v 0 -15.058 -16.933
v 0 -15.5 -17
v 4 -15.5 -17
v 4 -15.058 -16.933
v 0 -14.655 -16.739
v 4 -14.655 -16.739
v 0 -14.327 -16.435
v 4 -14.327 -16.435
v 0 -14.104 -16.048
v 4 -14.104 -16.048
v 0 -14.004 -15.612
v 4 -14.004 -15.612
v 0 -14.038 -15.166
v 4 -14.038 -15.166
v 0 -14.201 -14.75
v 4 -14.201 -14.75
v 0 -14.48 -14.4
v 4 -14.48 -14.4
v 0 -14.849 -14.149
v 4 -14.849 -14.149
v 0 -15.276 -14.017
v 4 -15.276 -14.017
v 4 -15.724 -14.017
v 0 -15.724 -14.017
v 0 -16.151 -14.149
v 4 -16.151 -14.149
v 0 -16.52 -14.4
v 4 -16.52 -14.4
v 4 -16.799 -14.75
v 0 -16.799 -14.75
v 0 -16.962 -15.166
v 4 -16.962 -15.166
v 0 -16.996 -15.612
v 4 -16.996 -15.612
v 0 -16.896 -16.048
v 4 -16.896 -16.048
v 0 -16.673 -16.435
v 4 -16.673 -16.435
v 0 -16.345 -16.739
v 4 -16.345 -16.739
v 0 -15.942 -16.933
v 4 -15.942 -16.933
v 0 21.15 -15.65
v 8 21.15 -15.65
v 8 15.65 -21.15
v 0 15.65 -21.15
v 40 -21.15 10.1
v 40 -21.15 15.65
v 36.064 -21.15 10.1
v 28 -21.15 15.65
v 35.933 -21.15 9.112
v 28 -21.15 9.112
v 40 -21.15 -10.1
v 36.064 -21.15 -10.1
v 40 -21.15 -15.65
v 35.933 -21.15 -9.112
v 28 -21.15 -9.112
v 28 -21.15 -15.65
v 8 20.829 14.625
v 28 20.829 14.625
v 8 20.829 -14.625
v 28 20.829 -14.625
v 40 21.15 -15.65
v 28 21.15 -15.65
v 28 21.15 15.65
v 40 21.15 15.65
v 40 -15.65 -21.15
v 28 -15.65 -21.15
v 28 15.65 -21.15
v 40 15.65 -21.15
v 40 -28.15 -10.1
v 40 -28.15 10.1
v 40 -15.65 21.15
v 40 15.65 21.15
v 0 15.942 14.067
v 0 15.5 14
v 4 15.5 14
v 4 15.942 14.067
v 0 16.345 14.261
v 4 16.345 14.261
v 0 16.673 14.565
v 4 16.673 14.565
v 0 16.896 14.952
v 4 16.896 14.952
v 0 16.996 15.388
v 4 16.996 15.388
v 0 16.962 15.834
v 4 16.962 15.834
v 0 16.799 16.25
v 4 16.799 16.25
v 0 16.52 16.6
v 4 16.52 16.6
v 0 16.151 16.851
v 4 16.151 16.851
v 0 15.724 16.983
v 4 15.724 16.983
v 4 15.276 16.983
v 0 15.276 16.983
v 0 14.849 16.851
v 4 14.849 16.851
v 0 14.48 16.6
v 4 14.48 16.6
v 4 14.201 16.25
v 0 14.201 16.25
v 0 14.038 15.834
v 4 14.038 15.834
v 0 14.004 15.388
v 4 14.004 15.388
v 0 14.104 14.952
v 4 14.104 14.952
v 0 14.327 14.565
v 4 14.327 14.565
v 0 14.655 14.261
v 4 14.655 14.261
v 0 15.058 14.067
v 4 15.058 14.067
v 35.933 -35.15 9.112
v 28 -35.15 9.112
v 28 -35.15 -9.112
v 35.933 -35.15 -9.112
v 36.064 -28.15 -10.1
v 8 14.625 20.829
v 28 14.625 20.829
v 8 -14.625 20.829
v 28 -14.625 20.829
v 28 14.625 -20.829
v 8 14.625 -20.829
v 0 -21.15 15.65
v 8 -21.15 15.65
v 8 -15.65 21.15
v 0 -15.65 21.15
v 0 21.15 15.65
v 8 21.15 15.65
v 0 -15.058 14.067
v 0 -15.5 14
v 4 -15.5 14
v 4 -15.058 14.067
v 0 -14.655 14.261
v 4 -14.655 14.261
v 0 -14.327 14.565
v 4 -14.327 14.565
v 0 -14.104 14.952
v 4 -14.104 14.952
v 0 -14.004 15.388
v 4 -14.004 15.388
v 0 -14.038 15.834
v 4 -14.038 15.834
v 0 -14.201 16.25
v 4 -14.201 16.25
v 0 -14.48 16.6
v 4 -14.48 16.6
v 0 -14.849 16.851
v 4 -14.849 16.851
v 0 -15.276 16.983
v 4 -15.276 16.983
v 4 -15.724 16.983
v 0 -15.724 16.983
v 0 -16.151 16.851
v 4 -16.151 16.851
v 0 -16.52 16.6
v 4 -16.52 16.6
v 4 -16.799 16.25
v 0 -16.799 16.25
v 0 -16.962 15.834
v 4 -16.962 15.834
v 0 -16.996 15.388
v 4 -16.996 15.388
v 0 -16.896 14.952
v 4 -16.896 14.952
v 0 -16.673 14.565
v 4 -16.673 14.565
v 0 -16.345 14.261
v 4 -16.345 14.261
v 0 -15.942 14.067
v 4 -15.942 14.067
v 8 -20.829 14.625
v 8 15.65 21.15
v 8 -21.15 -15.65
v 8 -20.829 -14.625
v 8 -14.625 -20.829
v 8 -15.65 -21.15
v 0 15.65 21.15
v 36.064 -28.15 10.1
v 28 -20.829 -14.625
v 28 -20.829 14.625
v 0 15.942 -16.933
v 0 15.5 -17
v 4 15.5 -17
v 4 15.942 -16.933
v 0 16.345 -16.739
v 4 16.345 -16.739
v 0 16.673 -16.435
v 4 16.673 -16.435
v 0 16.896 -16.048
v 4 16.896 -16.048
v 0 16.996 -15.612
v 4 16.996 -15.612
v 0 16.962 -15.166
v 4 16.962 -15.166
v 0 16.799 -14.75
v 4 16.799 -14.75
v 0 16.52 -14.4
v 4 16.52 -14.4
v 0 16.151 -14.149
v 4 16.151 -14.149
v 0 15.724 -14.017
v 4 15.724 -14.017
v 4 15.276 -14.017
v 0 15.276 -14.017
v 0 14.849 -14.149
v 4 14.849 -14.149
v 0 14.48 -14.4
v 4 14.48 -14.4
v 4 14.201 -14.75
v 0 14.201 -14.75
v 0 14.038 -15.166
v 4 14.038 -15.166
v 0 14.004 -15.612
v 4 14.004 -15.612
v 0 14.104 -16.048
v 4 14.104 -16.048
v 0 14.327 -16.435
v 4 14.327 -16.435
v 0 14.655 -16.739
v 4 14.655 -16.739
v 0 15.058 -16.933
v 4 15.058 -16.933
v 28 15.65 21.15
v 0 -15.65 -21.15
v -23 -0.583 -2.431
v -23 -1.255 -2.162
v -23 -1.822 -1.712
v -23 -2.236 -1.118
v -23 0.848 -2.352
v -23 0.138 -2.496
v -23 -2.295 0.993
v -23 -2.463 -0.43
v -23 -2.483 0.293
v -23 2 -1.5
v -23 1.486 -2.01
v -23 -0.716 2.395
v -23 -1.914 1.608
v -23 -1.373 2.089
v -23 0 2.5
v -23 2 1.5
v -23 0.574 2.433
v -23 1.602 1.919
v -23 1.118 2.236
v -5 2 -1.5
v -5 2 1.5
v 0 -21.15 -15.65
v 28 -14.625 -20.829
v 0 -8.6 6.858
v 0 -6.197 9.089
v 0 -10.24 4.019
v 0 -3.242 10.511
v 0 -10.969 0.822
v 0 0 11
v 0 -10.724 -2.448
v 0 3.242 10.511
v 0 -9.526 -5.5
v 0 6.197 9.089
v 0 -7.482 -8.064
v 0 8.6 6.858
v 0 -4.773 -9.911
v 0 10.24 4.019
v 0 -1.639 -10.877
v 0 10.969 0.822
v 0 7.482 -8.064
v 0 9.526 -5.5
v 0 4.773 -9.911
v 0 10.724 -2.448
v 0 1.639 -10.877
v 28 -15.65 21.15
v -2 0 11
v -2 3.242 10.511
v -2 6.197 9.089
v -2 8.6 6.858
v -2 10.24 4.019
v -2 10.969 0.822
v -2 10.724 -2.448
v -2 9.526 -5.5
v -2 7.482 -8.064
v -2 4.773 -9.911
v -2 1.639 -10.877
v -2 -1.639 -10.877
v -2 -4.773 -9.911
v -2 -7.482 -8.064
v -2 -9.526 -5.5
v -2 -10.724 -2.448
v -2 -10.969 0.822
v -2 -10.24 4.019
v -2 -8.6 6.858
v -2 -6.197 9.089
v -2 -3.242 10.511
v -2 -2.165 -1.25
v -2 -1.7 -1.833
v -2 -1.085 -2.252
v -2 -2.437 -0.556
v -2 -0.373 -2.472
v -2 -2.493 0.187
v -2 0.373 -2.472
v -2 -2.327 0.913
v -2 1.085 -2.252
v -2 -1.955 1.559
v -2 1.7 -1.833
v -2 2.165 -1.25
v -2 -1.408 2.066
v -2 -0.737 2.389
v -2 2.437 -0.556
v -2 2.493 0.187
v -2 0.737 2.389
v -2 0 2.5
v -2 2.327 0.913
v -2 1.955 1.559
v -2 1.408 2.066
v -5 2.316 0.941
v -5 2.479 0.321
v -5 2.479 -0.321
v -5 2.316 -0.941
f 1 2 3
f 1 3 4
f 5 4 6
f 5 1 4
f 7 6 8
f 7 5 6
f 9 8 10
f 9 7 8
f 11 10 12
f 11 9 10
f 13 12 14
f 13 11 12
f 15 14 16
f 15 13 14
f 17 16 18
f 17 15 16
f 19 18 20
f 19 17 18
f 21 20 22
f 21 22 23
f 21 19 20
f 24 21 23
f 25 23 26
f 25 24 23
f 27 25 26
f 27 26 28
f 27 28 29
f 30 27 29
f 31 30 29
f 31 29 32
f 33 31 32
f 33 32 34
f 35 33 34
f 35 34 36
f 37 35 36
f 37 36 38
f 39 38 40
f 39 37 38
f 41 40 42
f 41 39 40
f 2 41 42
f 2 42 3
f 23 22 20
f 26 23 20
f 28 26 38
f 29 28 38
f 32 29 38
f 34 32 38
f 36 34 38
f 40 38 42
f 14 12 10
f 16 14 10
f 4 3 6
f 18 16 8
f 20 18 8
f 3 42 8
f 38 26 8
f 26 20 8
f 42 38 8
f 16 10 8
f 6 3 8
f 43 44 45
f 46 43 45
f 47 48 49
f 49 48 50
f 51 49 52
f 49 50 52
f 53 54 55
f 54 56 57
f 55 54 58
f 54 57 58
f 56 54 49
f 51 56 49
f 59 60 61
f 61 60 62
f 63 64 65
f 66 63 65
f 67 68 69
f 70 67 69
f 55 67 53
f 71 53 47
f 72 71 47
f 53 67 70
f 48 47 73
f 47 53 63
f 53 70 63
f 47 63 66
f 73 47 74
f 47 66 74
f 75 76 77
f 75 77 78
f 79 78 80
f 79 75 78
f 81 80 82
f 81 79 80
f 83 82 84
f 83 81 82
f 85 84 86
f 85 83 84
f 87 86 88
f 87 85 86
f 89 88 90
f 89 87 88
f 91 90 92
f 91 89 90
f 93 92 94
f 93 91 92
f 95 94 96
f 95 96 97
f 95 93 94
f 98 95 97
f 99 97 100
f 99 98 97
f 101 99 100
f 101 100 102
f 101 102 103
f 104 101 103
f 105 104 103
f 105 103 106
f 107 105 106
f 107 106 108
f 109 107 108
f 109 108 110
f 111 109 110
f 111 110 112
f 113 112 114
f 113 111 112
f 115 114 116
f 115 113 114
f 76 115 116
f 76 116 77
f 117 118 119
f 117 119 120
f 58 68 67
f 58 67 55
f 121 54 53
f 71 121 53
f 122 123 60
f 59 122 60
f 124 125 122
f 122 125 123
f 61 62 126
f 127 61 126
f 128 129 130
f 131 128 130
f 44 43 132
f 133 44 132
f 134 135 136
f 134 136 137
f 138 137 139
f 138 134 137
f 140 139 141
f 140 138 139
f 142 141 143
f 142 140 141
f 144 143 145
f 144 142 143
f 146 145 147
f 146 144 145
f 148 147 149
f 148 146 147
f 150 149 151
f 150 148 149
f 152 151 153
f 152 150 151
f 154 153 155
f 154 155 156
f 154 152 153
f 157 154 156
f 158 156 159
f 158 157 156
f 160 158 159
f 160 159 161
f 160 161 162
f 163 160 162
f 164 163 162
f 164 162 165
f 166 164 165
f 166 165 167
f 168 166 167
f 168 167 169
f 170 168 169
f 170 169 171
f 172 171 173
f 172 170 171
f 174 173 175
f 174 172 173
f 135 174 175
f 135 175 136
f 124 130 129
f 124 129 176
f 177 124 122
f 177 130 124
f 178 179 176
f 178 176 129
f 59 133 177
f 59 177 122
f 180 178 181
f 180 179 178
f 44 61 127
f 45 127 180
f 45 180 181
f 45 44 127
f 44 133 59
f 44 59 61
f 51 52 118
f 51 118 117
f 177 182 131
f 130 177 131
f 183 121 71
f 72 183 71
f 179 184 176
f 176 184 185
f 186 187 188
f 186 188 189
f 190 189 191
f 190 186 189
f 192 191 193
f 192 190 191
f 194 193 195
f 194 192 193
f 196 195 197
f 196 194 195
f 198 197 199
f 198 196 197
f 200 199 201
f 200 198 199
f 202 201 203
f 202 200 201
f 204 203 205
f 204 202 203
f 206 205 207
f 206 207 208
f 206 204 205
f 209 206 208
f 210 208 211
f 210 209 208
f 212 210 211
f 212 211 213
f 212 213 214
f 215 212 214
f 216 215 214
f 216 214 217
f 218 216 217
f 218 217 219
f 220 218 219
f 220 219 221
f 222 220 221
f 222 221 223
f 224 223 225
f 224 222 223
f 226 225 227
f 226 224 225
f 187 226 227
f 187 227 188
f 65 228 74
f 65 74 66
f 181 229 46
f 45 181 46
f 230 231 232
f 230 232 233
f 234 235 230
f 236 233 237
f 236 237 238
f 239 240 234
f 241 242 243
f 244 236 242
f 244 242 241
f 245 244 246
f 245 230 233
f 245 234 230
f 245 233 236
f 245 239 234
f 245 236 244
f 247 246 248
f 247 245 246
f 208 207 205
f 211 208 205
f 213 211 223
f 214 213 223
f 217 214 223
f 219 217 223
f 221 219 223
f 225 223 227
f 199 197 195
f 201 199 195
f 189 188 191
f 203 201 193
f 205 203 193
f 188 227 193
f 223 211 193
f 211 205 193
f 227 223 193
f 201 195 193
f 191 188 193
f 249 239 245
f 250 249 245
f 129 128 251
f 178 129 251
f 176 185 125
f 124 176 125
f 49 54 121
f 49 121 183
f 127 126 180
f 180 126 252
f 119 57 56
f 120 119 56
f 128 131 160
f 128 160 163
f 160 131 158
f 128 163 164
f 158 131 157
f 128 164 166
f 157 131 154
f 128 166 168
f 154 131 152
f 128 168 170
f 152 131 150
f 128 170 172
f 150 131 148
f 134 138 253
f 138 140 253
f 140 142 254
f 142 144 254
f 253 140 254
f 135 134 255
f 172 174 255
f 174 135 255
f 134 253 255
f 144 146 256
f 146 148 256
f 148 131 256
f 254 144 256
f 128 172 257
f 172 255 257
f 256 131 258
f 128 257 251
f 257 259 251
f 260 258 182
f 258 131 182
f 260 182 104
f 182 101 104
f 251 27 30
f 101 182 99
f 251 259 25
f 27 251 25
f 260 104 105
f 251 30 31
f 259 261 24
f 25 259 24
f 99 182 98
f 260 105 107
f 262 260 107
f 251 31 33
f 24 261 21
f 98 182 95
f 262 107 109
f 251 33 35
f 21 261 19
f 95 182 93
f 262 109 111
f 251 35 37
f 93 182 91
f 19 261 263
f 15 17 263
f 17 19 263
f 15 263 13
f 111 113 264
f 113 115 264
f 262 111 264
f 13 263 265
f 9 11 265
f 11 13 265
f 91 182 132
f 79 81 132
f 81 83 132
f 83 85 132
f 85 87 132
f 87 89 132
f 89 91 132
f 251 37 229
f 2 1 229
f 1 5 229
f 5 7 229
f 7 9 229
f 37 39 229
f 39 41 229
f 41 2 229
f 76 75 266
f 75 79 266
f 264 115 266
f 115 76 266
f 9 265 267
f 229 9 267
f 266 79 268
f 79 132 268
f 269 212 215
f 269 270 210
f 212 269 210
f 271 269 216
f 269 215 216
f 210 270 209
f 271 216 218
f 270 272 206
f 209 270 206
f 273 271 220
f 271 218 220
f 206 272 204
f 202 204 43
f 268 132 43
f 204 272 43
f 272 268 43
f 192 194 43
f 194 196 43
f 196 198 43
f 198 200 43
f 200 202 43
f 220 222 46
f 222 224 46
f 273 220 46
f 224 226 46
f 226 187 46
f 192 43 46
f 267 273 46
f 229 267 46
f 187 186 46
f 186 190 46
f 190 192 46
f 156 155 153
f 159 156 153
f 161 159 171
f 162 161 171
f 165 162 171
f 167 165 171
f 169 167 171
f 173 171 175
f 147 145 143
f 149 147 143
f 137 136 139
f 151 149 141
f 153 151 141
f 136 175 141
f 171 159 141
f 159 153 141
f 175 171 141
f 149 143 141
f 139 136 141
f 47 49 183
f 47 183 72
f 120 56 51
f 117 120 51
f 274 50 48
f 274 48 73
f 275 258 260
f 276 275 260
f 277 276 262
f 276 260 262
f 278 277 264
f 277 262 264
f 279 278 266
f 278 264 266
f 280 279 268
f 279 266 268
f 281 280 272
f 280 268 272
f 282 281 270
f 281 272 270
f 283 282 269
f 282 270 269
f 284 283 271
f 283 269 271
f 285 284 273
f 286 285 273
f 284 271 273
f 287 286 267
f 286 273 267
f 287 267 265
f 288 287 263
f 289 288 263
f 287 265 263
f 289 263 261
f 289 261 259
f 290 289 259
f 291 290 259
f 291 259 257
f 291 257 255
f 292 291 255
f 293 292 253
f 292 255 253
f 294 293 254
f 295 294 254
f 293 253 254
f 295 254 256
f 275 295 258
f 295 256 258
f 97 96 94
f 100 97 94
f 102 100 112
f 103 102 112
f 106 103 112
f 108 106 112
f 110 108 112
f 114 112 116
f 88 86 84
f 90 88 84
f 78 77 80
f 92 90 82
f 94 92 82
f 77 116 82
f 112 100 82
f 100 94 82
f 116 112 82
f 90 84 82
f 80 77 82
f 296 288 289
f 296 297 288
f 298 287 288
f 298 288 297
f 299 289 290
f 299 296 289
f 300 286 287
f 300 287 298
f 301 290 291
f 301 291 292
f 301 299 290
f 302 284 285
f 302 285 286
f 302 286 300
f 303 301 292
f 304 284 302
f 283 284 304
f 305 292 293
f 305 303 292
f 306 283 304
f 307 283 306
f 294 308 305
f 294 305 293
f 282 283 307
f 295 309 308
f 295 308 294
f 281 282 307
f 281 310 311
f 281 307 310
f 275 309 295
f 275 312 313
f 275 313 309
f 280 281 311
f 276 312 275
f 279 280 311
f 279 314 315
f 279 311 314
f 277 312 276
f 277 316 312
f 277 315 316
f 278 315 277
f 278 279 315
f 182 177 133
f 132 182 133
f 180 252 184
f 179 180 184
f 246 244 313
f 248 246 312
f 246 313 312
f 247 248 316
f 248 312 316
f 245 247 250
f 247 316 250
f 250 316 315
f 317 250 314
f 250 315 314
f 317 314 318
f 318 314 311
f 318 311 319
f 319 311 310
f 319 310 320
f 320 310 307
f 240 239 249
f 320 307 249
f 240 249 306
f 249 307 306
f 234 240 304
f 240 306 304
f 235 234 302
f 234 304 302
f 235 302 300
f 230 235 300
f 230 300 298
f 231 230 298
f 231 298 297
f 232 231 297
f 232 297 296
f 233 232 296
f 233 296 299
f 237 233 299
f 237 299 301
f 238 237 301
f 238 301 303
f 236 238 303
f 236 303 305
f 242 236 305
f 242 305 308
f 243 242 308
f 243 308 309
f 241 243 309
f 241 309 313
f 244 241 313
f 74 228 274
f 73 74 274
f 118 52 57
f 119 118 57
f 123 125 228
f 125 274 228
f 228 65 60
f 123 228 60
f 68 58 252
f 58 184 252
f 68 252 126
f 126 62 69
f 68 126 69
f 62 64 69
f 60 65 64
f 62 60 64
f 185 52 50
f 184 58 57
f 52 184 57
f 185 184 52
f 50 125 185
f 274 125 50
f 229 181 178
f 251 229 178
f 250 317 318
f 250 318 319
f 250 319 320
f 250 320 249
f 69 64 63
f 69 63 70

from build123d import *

# Parameters (mm, degrees)
SKETCH1_R           = 1.5
BOSS_EXTRUDE1_DEPTH = 40
SKETCH1_3_R         = 1.5
CUT_EXTRUDE1_DEPTH  = 4
SKETCH3_R           = 11
SKETCH3_R_2         = 2.5
BOSS_EXTRUDE2_DEPTH = 2
SKETCH3_3_R         = 2.5
BOSS_EXTRUDE3_DEPTH = 23
CUT_EXTRUDE2_START  = -18
CUT_EXTRUDE2_DEPTH  = 18
CUT_EXTRUDE4_START  = -12
SKETCH5_W           = 55.059471924
SKETCH5_H           = 55.059471924
CUT_EXTRUDE4_DEPTH  = 20
SKETCH6_W           = 7.933477793
SKETCH6_H           = 18.223329292
BOSS_EXTRUDE4_DEPTH = 14
SKETCH7_W           = 3.936196897
SKETCH7_H           = 20.200423078
BOSS_EXTRUDE5_DEPTH = 7


with BuildPart() as part:
    # Sketch1 → Boss-Extrude1 (new body)
    # profile 1 of 5: a face of its own
    with BuildSketch(Plane(origin=(0, 0, 0), x_dir=(0, 0, -1), z_dir=(1, 0, 0))):
        Polygon((-15.65, 21.15), (0, 21.15), (15.65, 21.15), (21.15, 15.65), (21.15, 0), (21.15, -15.65), (15.65, -21.15), (0, -21.15), (-15.65, -21.15), (-21.15, -15.65), (-21.15, 0), (-21.15, 15.65), align=None)
        with Locations((-15.5, 15.5)):
            Circle(SKETCH1_R, mode=Mode.SUBTRACT)
        with Locations((-15.5, -15.5)):
            Circle(SKETCH1_R, mode=Mode.SUBTRACT)
        with Locations((15.5, -15.5)):
            Circle(SKETCH1_R, mode=Mode.SUBTRACT)
        with Locations((15.5, 15.5)):
            Circle(SKETCH1_R, mode=Mode.SUBTRACT)
    # profile 2 of 5: a face of its own
    with BuildSketch(Plane(origin=(0, 0, 0), x_dir=(0, 0, -1), z_dir=(1, 0, 0))):
        with Locations((15.5, -15.5)):
            Circle(SKETCH1_R)
    # profile 3 of 5: a face of its own
    with BuildSketch(Plane(origin=(0, 0, 0), x_dir=(0, 0, -1), z_dir=(1, 0, 0))):
        with Locations((-15.5, -15.5)):
            Circle(SKETCH1_R)
    # profile 4 of 5: a face of its own
    with BuildSketch(Plane(origin=(0, 0, 0), x_dir=(0, 0, -1), z_dir=(1, 0, 0))):
        with Locations((-15.5, 15.5)):
            Circle(SKETCH1_R)
    # profile 5 of 5: a face of its own
    with BuildSketch(Plane(origin=(0, 0, 0), x_dir=(0, 0, -1), z_dir=(1, 0, 0))):
        with Locations((15.5, 15.5)):
            Circle(SKETCH1_R)
    extrude(amount=BOSS_EXTRUDE1_DEPTH)

    # Sketch1<3> → Cut-Extrude1 (cut)
    with BuildSketch(Plane(origin=(0, 0, 0), x_dir=(0, 0, -1), z_dir=(1, 0, 0))):
        with Locations((-15.5, 15.5)):
            Circle(SKETCH1_3_R)
        with Locations((15.5, -15.5)):
            Circle(SKETCH1_3_R)
        with Locations((-15.5, -15.5)):
            Circle(SKETCH1_3_R)
        with Locations((15.5, 15.5)):
            Circle(SKETCH1_3_R)
    extrude(amount=CUT_EXTRUDE1_DEPTH, mode=Mode.SUBTRACT)

    # Sketch3 → Boss-Extrude2 (add)
    with BuildSketch(Plane.ZY):
        Circle(SKETCH3_R)
        Circle(SKETCH3_R_2, mode=Mode.SUBTRACT)
    extrude(amount=BOSS_EXTRUDE2_DEPTH)

    # Sketch3<3> → Boss-Extrude3 (add)
    with BuildSketch(Plane.ZY):
        Circle(SKETCH3_3_R)
    extrude(amount=BOSS_EXTRUDE3_DEPTH)

    # Sketch4 → Cut-Extrude2 (cut)
    with BuildSketch(Plane.ZY.offset(23).offset(CUT_EXTRUDE2_START)):
        with BuildLine():
            Line((-1.5, 2), (1.5, 2))
            ThreePointArc((1.5, 2), (0, 2.5), (-1.5, 2))
        make_face()
    extrude(amount=CUT_EXTRUDE2_DEPTH, mode=Mode.SUBTRACT)

    # Sketch5 → Cut-Extrude4 (cut)
    with BuildSketch(Plane(origin=(40, 0, 0), x_dir=(0, 0, -1), z_dir=(1, 0, 0)).offset(CUT_EXTRUDE4_START)):
        Rectangle(SKETCH5_W, SKETCH5_H)
        Polygon((-20.829250382, 14.625463373), (-14.625463373, 20.829250382), (14.625463373, 20.829250382), (20.829250382, 14.625463373), (20.829250382, -14.625463373), (14.625463373, -20.829250382), (-14.625463373, -20.829250382), (-20.829250382, -14.625463373), align=None, mode=Mode.SUBTRACT)
    extrude(amount=-CUT_EXTRUDE4_DEPTH, mode=Mode.SUBTRACT)

    # Sketch6 → Boss-Extrude4 (add)
    with BuildSketch(Plane.XZ.offset(21.15)):
        with Locations((31.966738897, 0)):
            Rectangle(SKETCH6_W, SKETCH6_H)
    extrude(amount=BOSS_EXTRUDE4_DEPTH)

    # Sketch7 → Boss-Extrude5 (add)
    with BuildSketch(Plane.XZ.offset(21.15)):
        with Locations((38.031901551, 0)):
            Rectangle(SKETCH7_W, SKETCH7_H)
    extrude(amount=BOSS_EXTRUDE5_DEPTH)


solid = part.part
